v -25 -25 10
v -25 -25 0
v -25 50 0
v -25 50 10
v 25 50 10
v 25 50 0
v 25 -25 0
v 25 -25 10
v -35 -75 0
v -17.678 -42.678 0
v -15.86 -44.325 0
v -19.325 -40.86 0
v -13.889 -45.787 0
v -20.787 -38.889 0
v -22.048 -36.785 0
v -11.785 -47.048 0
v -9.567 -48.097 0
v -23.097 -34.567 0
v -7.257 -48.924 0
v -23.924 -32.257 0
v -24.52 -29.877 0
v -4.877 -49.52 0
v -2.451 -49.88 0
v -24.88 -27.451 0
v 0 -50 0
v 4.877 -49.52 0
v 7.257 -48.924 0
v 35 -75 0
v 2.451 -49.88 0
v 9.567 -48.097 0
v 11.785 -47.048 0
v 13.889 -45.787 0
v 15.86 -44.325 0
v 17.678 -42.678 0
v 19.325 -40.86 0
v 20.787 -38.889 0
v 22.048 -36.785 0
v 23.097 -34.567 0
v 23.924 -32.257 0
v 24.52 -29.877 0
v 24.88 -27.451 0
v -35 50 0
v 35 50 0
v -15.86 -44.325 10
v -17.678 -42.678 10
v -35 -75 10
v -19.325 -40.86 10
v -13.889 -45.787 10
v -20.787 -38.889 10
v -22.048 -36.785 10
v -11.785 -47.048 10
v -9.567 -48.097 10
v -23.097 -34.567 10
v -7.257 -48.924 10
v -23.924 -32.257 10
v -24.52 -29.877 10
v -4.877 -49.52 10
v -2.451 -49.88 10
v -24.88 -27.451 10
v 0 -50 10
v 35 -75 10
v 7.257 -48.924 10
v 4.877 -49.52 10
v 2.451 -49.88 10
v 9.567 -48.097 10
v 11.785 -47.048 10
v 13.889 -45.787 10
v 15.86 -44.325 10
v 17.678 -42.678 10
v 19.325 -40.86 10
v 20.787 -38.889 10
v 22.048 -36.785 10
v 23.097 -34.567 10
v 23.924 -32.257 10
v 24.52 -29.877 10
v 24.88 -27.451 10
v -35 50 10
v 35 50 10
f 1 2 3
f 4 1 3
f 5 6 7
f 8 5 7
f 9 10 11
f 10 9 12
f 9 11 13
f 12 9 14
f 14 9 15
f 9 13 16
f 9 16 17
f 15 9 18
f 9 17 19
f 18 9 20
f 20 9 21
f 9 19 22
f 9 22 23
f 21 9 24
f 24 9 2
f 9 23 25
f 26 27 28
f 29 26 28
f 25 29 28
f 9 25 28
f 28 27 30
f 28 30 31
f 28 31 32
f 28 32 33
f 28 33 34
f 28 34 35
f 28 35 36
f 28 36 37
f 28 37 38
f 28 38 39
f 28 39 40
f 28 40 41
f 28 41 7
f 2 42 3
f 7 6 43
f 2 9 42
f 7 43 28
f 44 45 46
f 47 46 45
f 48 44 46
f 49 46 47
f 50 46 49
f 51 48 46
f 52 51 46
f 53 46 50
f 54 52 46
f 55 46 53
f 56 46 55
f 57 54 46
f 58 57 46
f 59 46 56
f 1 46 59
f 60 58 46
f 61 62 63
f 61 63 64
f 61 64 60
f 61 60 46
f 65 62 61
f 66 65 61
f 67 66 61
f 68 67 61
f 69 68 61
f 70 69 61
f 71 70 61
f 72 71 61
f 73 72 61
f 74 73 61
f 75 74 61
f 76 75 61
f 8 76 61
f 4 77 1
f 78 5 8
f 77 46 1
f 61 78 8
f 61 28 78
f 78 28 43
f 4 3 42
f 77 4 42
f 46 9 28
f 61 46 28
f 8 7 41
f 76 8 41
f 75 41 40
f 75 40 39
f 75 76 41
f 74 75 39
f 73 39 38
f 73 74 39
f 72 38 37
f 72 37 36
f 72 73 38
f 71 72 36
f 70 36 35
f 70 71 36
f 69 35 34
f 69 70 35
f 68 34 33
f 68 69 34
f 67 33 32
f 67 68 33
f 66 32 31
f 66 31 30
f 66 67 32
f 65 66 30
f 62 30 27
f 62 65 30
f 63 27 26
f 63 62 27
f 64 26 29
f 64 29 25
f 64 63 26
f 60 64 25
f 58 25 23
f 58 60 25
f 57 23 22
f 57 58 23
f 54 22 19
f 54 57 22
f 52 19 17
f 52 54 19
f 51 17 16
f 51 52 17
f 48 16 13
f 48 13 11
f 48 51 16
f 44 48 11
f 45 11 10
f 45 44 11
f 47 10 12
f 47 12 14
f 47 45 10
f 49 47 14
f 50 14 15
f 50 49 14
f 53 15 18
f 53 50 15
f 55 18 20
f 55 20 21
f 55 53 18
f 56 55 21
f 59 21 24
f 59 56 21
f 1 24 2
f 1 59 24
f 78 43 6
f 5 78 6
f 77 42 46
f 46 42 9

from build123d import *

# Parameters (mm, degrees)
BOSS_EXTRUDE1_DEPTH = 10
FILLET1_R           = 25


with BuildPart() as part:
    # Sketch1 → Boss-Extrude1 (new body)
    with BuildSketch(Plane.XY):
        Polygon((35, -75), (35, 50), (25, 50), (25, -50), (-25, -50), (-25, 50), (-35, 50), (-35, -75), align=None)
    extrude(amount=BOSS_EXTRUDE1_DEPTH)

    # Fillet1
    fillet1_edges = [part.edges().sort_by_distance(p)[0] for p in [
        (25, -50, 5),
        (-25, -50, 5),
    ]]
    fillet(fillet1_edges, radius=FILLET1_R - 0.0001)  # a hair under: the kernel refuses the full size


solid = part.part
